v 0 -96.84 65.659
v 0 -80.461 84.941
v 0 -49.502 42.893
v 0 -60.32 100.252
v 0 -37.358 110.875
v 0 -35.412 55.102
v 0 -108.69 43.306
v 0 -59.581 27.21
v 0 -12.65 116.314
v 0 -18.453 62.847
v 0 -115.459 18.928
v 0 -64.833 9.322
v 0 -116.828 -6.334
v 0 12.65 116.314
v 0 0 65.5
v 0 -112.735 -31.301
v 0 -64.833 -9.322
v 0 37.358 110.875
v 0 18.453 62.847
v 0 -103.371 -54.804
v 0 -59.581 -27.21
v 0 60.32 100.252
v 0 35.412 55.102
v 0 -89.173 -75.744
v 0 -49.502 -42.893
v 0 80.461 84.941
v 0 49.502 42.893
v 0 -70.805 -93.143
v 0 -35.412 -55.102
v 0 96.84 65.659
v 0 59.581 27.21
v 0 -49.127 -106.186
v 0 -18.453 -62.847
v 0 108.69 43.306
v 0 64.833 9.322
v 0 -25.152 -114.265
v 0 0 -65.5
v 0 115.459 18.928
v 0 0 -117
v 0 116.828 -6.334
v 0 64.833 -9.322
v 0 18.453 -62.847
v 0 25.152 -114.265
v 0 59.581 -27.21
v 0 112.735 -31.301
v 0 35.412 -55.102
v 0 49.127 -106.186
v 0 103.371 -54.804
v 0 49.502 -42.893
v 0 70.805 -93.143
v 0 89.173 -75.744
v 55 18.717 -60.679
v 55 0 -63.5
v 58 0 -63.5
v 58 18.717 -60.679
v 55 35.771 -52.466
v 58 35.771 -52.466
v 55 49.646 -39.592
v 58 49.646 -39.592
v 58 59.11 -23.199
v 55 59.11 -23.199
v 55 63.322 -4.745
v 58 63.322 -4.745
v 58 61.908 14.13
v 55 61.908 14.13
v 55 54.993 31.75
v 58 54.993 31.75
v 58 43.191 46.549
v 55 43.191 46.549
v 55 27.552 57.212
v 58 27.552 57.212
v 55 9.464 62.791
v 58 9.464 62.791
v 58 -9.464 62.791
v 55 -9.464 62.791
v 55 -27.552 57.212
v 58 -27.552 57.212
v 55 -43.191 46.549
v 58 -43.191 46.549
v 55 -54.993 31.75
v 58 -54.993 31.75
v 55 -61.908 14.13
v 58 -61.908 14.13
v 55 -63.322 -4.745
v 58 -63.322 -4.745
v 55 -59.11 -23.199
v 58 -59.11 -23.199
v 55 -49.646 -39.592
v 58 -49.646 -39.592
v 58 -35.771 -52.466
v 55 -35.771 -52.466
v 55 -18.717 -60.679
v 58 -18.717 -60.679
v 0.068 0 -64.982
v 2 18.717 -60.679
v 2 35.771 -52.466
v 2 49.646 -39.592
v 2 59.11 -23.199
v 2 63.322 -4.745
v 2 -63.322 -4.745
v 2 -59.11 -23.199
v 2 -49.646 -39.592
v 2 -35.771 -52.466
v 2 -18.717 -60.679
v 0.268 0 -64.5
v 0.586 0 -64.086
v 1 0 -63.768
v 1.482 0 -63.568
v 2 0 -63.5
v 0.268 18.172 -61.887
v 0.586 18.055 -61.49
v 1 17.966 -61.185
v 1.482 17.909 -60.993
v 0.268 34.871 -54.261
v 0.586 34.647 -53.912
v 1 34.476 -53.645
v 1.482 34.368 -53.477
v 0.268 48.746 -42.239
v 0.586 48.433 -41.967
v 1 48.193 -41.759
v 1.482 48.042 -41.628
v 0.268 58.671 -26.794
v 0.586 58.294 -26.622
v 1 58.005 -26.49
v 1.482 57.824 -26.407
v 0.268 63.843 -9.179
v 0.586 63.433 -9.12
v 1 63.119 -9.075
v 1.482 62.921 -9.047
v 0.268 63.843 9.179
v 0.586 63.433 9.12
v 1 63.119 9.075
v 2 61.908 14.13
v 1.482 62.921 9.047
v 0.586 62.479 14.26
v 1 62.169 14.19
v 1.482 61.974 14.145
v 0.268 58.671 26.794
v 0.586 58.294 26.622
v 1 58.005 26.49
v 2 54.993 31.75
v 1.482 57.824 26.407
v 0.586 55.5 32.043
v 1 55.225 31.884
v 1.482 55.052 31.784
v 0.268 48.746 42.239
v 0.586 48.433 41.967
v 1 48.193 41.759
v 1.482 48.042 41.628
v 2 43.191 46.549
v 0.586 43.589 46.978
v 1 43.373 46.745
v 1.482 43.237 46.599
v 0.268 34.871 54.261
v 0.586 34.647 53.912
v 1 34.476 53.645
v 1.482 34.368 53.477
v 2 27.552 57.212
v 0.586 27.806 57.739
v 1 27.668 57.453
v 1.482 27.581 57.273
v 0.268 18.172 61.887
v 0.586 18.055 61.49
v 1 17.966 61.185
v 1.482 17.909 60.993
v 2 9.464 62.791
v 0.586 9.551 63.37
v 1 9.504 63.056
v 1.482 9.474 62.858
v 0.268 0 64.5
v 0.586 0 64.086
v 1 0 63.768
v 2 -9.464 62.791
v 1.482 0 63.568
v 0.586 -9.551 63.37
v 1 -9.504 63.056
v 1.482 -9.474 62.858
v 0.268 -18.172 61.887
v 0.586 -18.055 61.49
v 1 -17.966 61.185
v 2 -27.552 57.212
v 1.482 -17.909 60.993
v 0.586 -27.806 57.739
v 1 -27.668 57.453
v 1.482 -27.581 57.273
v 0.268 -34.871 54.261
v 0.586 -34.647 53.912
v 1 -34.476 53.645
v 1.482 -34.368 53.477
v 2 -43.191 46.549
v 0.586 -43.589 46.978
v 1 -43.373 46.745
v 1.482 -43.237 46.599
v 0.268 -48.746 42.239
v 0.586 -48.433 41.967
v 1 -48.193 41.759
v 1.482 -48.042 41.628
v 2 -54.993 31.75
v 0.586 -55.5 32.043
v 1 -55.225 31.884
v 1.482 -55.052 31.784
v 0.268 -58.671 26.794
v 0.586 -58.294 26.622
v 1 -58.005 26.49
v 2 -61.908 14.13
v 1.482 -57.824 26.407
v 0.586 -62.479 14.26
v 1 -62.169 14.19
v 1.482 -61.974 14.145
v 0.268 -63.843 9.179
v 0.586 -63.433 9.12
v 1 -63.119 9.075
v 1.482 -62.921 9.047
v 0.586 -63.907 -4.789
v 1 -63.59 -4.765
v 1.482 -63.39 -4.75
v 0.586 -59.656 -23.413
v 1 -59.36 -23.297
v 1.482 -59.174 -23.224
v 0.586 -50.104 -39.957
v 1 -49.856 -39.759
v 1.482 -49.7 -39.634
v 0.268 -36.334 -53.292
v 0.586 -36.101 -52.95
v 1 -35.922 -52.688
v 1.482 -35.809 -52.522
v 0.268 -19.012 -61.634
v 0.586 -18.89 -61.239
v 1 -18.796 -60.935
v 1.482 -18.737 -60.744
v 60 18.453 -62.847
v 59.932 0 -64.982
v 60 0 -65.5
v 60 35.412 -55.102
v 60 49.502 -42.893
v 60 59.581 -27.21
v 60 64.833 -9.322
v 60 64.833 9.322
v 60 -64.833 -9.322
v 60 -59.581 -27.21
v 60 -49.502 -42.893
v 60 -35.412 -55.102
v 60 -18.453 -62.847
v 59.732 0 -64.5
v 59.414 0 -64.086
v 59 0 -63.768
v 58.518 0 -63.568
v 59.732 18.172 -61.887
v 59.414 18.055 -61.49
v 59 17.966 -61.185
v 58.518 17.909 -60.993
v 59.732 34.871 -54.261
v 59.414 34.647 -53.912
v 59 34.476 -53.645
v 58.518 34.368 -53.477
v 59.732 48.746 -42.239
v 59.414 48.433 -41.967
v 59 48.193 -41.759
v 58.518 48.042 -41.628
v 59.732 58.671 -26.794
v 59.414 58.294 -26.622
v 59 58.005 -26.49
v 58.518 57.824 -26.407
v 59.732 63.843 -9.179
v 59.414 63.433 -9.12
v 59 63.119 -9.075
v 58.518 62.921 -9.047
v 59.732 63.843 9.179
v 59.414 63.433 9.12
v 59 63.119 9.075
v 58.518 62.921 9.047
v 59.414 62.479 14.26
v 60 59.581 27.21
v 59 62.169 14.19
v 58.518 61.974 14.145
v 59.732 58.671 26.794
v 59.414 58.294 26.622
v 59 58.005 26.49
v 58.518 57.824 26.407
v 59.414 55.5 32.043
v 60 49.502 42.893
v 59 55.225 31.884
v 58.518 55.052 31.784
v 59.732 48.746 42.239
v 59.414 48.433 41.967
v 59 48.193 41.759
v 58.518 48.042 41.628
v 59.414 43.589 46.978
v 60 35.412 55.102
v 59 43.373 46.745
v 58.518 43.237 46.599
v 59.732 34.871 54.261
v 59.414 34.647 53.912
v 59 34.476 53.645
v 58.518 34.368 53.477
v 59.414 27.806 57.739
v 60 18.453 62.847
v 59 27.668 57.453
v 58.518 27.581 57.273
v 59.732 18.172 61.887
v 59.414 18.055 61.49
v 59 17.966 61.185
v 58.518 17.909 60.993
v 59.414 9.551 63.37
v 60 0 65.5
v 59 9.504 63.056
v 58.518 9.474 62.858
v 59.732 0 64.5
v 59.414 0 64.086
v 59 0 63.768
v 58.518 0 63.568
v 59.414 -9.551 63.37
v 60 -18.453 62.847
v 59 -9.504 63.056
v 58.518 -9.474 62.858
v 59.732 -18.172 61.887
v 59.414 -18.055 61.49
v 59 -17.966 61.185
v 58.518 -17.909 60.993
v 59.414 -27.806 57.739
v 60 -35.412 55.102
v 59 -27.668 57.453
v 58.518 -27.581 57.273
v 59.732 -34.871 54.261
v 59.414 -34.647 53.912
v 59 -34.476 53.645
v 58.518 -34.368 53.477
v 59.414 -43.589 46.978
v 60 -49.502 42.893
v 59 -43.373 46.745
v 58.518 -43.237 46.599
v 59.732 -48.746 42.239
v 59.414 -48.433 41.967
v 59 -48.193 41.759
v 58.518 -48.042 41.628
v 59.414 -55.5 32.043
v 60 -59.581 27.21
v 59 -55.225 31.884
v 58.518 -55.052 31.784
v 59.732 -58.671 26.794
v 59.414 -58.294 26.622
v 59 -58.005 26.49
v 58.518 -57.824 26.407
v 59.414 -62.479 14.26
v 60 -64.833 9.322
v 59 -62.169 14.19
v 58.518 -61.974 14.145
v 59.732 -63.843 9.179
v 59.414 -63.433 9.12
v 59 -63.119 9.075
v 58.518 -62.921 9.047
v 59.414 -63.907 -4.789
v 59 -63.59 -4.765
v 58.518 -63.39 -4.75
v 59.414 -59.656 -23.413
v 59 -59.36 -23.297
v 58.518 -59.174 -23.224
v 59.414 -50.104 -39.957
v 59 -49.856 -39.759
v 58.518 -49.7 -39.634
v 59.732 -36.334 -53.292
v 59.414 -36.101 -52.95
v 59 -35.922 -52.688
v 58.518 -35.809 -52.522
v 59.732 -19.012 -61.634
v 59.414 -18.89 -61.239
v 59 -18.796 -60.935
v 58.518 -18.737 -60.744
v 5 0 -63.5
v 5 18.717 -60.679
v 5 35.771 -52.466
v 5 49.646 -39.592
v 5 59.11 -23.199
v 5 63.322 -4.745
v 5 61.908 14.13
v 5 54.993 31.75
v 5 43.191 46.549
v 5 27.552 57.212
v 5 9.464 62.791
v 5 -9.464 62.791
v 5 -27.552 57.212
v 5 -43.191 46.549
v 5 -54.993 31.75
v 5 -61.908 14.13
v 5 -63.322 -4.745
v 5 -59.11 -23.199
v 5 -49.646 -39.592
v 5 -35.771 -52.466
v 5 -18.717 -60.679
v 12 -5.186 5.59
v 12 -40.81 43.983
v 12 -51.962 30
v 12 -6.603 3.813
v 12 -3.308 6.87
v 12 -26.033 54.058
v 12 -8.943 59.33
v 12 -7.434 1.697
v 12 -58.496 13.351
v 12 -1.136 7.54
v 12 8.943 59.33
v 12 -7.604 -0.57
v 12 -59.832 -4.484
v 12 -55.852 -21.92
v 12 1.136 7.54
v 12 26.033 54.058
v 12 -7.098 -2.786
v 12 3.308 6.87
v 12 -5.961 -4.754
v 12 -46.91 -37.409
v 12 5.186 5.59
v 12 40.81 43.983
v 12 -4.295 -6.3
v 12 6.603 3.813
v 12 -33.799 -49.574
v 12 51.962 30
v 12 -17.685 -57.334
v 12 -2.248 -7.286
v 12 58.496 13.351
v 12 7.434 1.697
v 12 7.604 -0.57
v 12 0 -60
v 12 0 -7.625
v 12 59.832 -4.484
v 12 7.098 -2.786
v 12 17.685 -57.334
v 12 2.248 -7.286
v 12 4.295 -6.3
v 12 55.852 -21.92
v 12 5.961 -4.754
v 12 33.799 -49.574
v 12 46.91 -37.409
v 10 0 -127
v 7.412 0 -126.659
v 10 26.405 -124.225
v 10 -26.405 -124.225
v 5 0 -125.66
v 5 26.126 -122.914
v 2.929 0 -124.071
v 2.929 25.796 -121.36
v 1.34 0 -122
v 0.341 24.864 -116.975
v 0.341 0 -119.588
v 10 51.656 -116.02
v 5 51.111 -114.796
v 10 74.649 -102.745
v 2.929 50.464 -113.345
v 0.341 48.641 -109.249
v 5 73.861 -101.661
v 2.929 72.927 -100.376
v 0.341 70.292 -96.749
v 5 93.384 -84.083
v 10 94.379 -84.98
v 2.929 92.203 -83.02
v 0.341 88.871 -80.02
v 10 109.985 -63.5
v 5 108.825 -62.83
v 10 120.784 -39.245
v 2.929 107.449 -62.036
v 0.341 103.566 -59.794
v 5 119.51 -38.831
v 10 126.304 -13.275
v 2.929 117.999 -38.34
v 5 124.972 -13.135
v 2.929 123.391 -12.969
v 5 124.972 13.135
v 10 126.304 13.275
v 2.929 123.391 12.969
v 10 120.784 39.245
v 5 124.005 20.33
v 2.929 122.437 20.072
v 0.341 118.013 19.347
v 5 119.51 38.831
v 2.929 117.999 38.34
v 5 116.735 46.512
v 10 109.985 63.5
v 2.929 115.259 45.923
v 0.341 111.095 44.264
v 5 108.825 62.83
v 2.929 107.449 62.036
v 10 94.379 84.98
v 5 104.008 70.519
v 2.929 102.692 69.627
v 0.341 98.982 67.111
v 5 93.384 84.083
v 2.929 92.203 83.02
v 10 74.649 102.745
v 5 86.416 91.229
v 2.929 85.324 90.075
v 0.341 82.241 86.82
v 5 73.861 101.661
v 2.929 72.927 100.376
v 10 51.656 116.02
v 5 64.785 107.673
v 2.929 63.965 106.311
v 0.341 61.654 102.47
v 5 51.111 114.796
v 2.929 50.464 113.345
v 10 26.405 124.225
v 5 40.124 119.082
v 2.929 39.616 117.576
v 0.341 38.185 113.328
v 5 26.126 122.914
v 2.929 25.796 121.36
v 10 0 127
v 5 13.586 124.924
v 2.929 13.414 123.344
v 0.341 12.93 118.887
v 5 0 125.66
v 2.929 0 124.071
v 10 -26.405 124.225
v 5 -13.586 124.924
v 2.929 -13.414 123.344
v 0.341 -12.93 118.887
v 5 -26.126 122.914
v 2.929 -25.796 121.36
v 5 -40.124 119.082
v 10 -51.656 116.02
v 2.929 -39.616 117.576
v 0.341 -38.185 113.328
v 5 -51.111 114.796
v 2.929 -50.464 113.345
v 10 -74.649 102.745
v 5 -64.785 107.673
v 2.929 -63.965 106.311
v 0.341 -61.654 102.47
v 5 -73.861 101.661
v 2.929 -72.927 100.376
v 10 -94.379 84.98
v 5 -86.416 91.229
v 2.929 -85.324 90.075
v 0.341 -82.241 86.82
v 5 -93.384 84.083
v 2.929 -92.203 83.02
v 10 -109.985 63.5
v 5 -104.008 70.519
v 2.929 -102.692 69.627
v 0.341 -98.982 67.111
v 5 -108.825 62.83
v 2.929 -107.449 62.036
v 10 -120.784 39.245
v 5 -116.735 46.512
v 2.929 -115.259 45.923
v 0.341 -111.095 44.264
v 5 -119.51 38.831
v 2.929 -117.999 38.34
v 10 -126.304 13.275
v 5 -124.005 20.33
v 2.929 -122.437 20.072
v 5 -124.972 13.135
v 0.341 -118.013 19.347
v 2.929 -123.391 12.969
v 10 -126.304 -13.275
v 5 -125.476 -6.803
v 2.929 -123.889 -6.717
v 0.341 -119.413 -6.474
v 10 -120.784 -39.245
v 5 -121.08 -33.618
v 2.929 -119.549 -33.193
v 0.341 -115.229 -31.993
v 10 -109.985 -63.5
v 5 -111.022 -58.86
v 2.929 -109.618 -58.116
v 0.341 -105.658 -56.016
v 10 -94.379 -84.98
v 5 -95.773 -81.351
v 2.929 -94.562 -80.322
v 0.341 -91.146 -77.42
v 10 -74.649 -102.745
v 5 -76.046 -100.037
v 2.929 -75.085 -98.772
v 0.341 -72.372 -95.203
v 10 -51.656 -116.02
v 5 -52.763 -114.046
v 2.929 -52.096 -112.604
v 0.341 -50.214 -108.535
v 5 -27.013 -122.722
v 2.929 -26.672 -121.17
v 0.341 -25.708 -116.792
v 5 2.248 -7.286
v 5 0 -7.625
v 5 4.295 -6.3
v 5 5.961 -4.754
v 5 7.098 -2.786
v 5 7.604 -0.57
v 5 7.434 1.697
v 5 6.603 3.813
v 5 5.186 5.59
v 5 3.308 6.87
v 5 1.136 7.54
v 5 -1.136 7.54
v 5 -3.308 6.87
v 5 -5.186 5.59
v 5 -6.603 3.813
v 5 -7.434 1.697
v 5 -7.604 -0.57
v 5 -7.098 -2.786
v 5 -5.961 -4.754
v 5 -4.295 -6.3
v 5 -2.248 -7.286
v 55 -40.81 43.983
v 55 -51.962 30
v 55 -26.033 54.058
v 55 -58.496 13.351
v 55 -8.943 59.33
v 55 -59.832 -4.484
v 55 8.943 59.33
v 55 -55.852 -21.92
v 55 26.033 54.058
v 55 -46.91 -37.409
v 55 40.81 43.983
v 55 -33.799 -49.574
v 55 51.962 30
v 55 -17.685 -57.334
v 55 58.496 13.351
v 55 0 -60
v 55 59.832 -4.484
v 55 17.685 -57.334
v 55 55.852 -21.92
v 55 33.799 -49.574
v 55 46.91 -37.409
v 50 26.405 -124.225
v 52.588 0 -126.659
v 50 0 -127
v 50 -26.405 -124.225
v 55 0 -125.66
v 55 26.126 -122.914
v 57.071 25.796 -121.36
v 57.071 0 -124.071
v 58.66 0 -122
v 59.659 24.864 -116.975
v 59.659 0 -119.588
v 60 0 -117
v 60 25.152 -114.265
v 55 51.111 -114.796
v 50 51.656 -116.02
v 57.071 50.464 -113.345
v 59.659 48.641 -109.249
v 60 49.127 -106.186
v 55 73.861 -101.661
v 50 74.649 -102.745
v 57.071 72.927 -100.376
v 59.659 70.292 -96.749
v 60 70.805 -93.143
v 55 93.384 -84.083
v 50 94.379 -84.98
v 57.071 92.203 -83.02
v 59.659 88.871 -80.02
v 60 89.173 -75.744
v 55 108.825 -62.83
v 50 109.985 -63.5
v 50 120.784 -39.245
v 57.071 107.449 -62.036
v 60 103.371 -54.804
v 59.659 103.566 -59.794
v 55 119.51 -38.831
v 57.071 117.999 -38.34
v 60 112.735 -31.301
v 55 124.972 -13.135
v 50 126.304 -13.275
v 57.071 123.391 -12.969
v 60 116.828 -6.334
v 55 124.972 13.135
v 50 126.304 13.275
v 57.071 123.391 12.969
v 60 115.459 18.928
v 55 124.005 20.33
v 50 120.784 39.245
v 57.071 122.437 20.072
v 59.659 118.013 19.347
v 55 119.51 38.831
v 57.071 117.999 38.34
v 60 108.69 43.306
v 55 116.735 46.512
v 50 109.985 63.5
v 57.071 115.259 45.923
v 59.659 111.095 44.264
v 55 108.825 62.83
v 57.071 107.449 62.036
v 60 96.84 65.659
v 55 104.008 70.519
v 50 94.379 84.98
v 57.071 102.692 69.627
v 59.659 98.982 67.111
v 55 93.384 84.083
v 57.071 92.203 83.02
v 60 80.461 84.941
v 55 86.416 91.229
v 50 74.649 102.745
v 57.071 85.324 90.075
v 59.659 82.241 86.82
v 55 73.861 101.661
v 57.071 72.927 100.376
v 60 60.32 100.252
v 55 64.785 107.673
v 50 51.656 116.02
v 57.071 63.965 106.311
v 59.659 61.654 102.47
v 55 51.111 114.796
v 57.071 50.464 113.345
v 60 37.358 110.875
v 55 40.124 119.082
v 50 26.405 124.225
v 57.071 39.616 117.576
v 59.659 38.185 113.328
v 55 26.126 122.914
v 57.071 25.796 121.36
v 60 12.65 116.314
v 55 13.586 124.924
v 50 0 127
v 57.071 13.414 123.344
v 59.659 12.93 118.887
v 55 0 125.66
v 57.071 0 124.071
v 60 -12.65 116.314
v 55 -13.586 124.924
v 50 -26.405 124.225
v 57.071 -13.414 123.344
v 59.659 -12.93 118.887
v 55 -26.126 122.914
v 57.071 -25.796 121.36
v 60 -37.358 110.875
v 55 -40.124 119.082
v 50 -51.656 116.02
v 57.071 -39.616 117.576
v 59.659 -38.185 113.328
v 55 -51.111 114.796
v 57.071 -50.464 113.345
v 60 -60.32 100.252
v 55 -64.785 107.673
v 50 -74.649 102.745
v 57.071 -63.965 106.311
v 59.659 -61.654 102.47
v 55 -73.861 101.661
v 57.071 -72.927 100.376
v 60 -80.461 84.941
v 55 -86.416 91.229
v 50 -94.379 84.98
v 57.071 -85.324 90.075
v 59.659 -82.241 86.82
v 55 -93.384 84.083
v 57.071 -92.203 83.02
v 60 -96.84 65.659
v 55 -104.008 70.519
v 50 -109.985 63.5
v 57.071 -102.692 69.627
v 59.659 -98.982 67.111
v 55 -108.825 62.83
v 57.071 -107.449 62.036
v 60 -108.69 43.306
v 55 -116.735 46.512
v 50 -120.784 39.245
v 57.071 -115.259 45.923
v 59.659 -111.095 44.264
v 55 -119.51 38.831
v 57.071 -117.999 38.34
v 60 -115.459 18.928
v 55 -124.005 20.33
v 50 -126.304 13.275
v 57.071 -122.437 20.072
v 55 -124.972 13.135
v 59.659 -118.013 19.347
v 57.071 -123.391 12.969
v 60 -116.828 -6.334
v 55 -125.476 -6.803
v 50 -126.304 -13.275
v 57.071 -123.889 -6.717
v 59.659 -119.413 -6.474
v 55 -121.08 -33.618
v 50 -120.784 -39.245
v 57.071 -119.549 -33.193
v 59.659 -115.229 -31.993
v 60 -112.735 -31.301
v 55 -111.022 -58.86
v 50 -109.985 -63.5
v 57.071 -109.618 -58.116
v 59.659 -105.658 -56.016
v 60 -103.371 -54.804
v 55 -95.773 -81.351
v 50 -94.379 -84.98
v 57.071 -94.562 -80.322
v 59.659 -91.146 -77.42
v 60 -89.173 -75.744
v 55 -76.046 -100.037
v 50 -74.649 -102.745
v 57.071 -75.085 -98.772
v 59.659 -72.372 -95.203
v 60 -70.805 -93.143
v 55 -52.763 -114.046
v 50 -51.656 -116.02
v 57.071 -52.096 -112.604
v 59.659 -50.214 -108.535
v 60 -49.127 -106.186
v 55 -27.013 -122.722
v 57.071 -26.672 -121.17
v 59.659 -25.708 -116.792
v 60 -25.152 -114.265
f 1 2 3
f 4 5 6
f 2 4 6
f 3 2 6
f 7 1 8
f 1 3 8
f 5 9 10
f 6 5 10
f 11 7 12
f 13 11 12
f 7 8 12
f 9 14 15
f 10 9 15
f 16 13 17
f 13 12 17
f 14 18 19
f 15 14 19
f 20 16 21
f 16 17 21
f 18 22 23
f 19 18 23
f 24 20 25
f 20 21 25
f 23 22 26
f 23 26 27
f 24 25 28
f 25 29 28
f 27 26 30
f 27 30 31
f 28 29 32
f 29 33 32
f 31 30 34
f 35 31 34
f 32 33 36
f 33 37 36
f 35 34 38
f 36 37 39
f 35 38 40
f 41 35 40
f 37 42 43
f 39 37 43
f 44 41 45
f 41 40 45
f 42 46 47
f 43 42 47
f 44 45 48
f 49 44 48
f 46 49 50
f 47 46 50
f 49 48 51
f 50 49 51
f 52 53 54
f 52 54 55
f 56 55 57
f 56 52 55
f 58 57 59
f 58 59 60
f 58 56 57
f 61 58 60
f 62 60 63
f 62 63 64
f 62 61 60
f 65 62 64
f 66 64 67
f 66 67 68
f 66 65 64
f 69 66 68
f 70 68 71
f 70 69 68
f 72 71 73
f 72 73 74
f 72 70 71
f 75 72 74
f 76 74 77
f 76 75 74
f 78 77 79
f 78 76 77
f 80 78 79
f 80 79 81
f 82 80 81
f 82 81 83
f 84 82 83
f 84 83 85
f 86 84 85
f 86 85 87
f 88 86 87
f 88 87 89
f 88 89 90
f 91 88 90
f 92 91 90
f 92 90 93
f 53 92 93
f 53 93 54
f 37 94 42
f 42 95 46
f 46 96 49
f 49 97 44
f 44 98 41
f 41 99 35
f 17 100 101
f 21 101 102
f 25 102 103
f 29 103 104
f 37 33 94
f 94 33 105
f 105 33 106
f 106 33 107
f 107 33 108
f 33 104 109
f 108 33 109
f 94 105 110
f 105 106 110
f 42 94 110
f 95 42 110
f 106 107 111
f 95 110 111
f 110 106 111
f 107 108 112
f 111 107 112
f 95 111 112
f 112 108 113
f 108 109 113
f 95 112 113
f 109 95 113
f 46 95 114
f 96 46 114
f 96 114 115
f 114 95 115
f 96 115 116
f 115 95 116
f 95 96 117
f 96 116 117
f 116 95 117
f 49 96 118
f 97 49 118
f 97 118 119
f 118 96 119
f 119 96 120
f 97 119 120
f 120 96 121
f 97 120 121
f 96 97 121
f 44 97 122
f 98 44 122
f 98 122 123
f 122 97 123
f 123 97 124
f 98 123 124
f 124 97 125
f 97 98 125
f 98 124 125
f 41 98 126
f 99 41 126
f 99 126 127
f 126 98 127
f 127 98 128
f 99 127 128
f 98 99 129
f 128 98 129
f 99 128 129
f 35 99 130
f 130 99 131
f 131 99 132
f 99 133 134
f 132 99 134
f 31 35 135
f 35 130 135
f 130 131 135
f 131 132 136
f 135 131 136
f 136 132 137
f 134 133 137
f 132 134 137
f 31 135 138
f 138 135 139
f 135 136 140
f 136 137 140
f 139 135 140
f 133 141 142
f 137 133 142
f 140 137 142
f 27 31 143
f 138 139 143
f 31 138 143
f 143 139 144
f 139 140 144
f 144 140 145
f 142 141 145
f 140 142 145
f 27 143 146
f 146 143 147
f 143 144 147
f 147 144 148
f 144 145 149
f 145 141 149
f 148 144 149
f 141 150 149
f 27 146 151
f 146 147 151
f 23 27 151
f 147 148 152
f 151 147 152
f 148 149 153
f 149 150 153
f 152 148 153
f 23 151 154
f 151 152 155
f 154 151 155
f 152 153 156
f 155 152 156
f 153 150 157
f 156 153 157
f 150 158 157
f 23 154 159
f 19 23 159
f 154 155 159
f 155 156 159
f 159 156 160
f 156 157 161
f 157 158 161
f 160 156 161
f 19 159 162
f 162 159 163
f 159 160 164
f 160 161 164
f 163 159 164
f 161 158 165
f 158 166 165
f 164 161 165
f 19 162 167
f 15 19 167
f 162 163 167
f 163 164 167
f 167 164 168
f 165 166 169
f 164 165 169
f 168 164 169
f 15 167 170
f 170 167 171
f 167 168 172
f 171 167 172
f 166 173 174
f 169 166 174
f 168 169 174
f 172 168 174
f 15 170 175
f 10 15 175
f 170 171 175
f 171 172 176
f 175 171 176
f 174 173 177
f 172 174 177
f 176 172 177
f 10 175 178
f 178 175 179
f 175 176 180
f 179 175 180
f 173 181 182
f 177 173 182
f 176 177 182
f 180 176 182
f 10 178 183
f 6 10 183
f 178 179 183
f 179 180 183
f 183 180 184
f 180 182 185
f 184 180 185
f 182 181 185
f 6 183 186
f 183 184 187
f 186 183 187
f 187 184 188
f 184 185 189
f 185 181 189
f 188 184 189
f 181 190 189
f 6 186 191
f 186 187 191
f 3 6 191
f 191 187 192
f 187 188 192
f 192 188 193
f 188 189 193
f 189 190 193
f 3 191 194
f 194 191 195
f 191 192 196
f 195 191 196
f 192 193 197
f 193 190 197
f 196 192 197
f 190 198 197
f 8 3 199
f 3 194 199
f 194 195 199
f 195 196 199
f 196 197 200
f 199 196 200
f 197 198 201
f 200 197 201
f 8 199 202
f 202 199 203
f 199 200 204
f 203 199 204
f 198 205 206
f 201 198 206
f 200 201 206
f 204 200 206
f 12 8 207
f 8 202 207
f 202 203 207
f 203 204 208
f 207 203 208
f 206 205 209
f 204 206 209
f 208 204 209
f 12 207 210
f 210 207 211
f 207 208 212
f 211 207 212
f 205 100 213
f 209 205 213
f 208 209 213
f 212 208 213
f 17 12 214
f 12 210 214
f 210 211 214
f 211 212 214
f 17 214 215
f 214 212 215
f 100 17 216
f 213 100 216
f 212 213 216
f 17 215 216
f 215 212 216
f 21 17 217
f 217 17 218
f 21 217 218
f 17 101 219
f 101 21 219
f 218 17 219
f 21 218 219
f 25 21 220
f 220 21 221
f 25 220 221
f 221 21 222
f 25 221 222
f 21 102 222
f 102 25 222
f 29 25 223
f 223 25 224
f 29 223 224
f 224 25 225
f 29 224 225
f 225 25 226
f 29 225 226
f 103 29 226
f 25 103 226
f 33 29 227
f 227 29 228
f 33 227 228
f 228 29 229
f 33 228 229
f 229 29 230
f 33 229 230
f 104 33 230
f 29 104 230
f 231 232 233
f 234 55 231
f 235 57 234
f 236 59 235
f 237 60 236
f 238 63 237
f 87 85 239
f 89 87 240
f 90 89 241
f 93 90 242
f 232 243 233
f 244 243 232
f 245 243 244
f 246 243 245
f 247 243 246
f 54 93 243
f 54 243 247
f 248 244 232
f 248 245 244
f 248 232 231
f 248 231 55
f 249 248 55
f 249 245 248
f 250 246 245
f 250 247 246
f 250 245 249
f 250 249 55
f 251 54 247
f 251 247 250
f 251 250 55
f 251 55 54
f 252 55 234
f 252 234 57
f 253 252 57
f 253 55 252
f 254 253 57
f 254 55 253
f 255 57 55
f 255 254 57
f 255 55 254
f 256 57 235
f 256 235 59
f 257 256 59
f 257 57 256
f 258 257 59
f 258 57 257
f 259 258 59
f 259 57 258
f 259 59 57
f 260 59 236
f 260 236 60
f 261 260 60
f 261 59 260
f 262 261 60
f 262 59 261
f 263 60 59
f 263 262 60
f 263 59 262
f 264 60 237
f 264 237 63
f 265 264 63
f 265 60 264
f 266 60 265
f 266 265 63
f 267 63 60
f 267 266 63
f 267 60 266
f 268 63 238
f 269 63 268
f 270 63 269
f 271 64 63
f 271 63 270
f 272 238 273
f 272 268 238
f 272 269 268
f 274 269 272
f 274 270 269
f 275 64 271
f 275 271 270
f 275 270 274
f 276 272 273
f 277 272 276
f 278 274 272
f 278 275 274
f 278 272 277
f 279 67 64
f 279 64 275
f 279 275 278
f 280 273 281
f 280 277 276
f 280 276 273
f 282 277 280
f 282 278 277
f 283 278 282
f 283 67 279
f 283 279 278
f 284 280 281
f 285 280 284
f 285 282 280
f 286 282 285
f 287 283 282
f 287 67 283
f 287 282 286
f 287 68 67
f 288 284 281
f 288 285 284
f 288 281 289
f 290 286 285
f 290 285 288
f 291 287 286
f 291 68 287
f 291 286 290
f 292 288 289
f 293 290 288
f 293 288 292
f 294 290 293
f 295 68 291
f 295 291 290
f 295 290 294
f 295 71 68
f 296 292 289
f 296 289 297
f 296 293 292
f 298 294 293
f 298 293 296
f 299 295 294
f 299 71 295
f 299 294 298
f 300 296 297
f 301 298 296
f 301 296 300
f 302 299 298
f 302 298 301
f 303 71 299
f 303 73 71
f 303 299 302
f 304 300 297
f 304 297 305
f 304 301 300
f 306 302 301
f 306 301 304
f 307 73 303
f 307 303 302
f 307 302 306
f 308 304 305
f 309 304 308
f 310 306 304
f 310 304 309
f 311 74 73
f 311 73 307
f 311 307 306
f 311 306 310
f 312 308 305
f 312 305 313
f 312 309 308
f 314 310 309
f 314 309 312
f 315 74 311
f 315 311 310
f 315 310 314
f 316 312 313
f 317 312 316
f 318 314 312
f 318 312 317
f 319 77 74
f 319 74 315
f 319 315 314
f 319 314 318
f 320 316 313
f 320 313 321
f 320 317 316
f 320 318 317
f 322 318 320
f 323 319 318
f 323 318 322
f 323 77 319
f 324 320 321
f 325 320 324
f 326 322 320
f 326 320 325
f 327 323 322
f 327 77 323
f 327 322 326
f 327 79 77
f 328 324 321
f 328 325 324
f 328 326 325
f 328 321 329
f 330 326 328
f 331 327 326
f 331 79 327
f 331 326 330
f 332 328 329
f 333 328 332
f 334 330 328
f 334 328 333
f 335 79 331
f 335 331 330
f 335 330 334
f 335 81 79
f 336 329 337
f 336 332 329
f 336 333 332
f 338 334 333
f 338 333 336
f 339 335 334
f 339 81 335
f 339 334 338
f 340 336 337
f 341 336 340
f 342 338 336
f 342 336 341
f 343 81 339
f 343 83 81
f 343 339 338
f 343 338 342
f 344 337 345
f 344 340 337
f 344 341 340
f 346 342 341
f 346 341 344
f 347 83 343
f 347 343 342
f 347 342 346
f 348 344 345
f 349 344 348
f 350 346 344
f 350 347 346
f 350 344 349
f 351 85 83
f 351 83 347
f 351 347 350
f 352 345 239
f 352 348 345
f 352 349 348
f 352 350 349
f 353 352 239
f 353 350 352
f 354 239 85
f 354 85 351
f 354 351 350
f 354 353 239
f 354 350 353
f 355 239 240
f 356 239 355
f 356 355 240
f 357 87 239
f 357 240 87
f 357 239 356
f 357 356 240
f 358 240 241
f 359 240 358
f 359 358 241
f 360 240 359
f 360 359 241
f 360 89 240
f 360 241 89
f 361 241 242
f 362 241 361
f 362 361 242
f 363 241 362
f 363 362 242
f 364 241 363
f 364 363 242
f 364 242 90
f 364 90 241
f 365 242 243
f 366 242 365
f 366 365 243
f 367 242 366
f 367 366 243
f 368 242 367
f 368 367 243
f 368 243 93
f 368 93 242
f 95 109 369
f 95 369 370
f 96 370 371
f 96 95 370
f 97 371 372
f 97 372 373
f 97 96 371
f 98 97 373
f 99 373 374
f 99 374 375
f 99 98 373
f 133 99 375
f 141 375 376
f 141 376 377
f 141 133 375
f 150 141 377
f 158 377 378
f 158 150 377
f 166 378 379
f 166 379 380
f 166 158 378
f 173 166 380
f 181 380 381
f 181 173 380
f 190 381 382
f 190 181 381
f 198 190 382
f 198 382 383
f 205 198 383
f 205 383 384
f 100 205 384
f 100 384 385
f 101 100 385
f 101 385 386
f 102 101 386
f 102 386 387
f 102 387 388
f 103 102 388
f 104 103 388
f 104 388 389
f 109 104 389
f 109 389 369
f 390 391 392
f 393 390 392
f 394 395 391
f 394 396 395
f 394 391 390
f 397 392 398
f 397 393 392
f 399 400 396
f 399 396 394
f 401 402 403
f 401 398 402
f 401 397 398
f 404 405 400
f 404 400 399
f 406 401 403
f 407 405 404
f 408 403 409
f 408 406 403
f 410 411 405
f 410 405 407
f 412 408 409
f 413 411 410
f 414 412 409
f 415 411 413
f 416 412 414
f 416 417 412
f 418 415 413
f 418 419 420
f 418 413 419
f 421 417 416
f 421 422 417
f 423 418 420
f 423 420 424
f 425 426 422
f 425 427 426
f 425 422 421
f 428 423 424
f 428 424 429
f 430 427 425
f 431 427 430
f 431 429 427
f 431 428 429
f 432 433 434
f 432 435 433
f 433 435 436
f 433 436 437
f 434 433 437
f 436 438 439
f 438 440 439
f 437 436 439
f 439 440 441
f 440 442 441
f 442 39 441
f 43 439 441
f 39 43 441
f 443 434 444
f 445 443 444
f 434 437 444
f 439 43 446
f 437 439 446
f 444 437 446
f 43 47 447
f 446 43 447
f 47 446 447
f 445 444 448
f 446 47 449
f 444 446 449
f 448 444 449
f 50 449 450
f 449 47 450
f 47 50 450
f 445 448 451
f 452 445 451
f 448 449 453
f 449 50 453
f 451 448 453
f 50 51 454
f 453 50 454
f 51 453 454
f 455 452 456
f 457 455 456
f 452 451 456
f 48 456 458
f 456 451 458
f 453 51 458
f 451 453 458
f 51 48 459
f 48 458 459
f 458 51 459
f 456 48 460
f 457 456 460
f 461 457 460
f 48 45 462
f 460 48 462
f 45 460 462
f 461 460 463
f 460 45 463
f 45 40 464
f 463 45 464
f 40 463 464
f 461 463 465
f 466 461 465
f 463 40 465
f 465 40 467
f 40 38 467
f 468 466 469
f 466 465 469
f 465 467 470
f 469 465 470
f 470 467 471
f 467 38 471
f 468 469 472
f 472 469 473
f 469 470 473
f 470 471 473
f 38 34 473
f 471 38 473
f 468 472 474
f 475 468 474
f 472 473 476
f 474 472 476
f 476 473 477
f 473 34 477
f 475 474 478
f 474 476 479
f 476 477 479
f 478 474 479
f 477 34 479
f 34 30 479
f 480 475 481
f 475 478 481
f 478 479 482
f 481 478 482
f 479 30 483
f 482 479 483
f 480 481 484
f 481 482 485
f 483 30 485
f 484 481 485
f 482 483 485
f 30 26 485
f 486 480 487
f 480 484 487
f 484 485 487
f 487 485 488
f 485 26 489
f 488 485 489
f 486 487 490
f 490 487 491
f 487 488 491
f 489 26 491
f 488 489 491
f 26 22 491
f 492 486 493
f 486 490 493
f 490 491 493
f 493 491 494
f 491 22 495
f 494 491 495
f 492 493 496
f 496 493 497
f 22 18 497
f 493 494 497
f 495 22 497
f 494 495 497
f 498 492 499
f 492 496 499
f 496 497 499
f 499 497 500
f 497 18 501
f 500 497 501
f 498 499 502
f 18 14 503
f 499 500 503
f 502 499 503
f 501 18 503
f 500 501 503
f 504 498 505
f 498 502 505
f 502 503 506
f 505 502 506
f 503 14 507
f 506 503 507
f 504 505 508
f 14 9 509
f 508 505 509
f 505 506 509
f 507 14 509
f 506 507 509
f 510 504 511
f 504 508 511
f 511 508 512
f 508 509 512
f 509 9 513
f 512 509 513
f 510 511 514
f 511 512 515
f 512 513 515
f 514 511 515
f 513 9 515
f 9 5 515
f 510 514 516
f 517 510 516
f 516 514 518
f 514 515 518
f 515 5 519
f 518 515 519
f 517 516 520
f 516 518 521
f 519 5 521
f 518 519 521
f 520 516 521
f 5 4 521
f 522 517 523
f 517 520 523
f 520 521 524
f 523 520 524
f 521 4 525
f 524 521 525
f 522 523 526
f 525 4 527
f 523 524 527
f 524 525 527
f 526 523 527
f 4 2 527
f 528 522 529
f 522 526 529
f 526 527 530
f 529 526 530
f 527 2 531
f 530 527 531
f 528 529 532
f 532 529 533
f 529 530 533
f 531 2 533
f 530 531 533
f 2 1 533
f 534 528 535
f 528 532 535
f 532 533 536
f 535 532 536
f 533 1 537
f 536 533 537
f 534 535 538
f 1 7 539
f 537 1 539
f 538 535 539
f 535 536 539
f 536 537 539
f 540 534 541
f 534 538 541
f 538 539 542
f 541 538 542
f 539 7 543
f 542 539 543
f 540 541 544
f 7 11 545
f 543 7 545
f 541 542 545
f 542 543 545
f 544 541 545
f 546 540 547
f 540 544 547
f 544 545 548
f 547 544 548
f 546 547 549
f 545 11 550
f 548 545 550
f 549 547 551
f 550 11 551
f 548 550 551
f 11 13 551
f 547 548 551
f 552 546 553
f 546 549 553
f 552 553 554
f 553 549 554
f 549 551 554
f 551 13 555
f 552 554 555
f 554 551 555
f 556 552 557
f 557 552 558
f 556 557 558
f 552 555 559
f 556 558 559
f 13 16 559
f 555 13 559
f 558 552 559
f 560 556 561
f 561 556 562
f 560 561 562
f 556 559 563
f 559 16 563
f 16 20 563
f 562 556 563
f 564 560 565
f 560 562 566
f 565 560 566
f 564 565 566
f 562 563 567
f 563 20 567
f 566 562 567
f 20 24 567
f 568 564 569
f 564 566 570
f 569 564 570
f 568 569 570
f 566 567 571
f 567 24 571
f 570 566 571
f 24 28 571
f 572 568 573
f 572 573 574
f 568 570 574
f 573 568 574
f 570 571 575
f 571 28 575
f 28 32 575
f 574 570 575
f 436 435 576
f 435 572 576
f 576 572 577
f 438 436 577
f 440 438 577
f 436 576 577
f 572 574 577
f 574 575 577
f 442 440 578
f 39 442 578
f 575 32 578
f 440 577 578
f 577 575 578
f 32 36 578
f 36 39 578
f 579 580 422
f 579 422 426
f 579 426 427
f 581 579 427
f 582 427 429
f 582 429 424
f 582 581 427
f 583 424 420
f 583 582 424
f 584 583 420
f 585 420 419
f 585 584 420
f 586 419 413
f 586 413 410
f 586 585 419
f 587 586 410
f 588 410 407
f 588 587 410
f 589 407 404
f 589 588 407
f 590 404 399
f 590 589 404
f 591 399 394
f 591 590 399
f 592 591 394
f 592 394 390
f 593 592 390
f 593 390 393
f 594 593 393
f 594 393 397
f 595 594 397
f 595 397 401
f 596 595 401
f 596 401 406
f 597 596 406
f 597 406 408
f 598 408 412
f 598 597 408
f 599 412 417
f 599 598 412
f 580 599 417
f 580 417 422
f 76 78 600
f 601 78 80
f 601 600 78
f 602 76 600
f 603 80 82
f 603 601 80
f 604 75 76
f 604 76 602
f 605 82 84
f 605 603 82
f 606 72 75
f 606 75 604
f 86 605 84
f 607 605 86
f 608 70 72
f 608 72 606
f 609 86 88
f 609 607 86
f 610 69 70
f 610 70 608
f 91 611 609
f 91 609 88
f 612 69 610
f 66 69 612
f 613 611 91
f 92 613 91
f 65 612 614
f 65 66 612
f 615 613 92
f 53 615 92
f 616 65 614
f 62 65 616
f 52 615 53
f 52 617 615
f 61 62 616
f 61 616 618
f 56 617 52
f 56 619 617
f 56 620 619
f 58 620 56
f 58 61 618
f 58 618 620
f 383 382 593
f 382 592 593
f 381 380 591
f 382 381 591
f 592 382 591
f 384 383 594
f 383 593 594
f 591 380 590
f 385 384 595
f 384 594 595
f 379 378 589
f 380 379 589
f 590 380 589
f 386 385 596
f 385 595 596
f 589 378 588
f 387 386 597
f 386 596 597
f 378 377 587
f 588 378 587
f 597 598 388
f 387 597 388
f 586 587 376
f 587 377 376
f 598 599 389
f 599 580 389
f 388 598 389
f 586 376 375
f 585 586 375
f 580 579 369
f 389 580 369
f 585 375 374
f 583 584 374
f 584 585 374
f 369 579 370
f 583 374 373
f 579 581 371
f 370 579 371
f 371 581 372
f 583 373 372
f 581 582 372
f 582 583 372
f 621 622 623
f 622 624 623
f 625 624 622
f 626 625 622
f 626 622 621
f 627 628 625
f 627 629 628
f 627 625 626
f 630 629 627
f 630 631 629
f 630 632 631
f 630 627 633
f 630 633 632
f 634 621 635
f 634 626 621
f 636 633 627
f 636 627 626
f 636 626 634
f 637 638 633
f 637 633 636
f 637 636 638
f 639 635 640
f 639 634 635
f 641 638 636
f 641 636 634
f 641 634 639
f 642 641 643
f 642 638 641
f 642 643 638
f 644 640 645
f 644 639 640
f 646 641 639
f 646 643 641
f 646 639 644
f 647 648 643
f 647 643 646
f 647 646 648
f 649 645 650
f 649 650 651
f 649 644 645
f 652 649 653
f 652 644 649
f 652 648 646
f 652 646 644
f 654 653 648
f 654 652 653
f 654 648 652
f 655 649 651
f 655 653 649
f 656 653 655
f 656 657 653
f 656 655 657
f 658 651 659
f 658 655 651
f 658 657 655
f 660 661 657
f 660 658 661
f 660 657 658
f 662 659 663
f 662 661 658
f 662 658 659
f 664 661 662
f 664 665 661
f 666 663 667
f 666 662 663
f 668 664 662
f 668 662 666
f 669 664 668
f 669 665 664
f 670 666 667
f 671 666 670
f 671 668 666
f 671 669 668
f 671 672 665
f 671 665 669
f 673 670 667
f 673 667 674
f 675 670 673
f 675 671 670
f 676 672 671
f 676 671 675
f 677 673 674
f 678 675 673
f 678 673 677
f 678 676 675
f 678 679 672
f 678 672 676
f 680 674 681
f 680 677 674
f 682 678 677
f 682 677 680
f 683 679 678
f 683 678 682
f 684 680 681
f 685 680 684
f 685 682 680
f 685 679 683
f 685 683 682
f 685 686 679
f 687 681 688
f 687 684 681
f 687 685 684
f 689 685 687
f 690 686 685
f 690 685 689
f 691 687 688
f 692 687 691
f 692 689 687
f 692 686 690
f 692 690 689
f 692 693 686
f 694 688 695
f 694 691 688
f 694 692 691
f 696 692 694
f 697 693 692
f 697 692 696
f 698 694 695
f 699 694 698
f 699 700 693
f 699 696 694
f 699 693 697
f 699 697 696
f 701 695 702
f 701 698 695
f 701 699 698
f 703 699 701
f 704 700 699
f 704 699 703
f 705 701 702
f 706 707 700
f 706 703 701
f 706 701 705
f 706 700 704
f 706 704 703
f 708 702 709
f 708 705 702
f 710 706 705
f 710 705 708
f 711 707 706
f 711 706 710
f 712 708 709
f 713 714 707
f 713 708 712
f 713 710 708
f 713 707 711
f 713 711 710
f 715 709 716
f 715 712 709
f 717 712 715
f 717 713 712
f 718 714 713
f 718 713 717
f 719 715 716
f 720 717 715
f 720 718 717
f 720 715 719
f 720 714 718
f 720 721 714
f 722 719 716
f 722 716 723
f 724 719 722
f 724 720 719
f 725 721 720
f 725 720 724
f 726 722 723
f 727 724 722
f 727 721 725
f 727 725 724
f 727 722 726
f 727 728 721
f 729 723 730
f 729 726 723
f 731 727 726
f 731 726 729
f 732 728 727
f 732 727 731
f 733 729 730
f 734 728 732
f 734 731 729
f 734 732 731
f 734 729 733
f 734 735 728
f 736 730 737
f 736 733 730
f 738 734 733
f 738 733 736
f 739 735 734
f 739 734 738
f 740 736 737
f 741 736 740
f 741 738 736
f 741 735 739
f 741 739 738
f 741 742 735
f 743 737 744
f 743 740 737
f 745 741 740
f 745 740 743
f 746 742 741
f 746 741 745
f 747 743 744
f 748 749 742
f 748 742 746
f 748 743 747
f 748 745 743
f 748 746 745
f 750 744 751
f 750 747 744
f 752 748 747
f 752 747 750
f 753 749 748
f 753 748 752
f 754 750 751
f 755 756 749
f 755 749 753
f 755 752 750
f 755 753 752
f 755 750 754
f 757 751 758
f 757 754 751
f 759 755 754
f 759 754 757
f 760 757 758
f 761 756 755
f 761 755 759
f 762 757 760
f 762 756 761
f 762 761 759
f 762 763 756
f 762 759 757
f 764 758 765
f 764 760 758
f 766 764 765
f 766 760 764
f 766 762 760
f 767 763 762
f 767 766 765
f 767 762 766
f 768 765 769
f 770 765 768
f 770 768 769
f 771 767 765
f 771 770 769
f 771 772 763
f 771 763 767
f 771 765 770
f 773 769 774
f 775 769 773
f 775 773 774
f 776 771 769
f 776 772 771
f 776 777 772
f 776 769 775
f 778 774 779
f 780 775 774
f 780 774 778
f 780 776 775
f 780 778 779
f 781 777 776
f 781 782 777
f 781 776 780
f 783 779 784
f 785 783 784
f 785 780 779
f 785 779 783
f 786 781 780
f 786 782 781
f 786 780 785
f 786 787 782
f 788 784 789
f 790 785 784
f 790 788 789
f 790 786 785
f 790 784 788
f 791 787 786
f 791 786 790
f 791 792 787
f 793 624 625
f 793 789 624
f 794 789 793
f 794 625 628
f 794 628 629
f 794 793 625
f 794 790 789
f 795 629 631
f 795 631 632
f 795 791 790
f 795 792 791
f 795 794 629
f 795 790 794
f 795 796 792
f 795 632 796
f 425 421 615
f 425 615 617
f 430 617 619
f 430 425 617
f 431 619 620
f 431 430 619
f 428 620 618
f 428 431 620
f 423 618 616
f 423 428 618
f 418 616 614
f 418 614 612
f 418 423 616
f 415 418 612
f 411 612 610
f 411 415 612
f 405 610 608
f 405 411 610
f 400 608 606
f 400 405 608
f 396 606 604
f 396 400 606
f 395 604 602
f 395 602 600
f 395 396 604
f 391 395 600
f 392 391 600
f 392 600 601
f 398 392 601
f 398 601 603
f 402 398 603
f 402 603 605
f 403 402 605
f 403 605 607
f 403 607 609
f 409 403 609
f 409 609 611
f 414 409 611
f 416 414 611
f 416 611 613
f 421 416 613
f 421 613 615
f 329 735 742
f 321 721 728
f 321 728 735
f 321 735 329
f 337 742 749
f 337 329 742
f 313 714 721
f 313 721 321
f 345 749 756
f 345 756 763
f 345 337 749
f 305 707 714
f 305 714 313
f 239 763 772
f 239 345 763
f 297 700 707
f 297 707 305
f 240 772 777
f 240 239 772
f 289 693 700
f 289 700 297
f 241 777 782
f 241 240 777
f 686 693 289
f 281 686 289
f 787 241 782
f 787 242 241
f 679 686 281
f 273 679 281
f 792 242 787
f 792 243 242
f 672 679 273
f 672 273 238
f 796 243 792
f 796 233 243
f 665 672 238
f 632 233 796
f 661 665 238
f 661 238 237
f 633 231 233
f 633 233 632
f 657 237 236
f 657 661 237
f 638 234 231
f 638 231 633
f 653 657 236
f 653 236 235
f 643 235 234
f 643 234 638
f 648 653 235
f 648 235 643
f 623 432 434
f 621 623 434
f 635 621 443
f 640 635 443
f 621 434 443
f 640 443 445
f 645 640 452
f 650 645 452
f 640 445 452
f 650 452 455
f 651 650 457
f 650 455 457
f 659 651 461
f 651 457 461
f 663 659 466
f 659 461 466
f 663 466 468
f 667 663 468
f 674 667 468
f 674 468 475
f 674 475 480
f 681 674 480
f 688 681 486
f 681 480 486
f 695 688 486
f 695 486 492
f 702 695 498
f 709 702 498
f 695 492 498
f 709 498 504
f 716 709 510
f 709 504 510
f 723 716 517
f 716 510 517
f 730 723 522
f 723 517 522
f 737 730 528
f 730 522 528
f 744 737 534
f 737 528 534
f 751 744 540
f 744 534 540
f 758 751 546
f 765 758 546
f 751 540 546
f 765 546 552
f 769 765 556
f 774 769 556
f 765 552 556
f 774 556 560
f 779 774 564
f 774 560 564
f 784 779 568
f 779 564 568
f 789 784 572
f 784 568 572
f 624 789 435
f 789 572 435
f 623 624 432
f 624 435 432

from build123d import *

# Parameters (mm, degrees)
HUB_START      = 5
SKETCH1_R      = 63.5
SKETCH1_R_2    = 7.625
HUB_FACE_DEPTH = 7
SKETCH2_R      = 63.5
SKETCH2_R_2    = 60
HUB_DEPTH      = 50
SKETCH3_R      = 127
SKETCH3_R_2    = 63.5
RUBBER_DEPTH   = 60
FILLET1_R      = 10
FILLET2_R      = 2


with BuildPart() as part:
    # Sketch1 → Hub Face (new body)
    with BuildSketch(Plane(origin=(0, 0, 0), x_dir=(0, 0, -1), z_dir=(1, 0, 0)).offset(HUB_START)):
        Circle(SKETCH1_R)
        Circle(SKETCH1_R_2, mode=Mode.SUBTRACT)
    extrude(amount=HUB_FACE_DEPTH)

    # Sketch2 → Hub (add)
    with BuildSketch(Plane(origin=(0, 0, 0), x_dir=(0, 0, -1), z_dir=(1, 0, 0)).offset(HUB_START)):
        Circle(SKETCH2_R)
        Circle(SKETCH2_R_2, mode=Mode.SUBTRACT)
    extrude(amount=HUB_DEPTH)

    # Sketch3 → Rubber (add)
    with BuildSketch(Plane(origin=(0, 0, 0), x_dir=(0, 0, -1), z_dir=(1, 0, 0))):
        Circle(SKETCH3_R)
        Circle(SKETCH3_R_2, mode=Mode.SUBTRACT)
    extrude(amount=RUBBER_DEPTH)

    # Fillet1
    fillet1_edges = [part.edges().sort_by_distance(p)[0] for p in [
        (60, 0, 127),
        (0, 0, 127),
    ]]
    fillet(fillet1_edges, radius=FILLET1_R)

    # Fillet2
    fillet2_edges = [part.edges().sort_by_distance(p)[0] for p in [
        (0, 0, 63.5),
        (60, 0, 63.5),
    ]]
    fillet(fillet2_edges, radius=FILLET2_R)


solid = part.part
